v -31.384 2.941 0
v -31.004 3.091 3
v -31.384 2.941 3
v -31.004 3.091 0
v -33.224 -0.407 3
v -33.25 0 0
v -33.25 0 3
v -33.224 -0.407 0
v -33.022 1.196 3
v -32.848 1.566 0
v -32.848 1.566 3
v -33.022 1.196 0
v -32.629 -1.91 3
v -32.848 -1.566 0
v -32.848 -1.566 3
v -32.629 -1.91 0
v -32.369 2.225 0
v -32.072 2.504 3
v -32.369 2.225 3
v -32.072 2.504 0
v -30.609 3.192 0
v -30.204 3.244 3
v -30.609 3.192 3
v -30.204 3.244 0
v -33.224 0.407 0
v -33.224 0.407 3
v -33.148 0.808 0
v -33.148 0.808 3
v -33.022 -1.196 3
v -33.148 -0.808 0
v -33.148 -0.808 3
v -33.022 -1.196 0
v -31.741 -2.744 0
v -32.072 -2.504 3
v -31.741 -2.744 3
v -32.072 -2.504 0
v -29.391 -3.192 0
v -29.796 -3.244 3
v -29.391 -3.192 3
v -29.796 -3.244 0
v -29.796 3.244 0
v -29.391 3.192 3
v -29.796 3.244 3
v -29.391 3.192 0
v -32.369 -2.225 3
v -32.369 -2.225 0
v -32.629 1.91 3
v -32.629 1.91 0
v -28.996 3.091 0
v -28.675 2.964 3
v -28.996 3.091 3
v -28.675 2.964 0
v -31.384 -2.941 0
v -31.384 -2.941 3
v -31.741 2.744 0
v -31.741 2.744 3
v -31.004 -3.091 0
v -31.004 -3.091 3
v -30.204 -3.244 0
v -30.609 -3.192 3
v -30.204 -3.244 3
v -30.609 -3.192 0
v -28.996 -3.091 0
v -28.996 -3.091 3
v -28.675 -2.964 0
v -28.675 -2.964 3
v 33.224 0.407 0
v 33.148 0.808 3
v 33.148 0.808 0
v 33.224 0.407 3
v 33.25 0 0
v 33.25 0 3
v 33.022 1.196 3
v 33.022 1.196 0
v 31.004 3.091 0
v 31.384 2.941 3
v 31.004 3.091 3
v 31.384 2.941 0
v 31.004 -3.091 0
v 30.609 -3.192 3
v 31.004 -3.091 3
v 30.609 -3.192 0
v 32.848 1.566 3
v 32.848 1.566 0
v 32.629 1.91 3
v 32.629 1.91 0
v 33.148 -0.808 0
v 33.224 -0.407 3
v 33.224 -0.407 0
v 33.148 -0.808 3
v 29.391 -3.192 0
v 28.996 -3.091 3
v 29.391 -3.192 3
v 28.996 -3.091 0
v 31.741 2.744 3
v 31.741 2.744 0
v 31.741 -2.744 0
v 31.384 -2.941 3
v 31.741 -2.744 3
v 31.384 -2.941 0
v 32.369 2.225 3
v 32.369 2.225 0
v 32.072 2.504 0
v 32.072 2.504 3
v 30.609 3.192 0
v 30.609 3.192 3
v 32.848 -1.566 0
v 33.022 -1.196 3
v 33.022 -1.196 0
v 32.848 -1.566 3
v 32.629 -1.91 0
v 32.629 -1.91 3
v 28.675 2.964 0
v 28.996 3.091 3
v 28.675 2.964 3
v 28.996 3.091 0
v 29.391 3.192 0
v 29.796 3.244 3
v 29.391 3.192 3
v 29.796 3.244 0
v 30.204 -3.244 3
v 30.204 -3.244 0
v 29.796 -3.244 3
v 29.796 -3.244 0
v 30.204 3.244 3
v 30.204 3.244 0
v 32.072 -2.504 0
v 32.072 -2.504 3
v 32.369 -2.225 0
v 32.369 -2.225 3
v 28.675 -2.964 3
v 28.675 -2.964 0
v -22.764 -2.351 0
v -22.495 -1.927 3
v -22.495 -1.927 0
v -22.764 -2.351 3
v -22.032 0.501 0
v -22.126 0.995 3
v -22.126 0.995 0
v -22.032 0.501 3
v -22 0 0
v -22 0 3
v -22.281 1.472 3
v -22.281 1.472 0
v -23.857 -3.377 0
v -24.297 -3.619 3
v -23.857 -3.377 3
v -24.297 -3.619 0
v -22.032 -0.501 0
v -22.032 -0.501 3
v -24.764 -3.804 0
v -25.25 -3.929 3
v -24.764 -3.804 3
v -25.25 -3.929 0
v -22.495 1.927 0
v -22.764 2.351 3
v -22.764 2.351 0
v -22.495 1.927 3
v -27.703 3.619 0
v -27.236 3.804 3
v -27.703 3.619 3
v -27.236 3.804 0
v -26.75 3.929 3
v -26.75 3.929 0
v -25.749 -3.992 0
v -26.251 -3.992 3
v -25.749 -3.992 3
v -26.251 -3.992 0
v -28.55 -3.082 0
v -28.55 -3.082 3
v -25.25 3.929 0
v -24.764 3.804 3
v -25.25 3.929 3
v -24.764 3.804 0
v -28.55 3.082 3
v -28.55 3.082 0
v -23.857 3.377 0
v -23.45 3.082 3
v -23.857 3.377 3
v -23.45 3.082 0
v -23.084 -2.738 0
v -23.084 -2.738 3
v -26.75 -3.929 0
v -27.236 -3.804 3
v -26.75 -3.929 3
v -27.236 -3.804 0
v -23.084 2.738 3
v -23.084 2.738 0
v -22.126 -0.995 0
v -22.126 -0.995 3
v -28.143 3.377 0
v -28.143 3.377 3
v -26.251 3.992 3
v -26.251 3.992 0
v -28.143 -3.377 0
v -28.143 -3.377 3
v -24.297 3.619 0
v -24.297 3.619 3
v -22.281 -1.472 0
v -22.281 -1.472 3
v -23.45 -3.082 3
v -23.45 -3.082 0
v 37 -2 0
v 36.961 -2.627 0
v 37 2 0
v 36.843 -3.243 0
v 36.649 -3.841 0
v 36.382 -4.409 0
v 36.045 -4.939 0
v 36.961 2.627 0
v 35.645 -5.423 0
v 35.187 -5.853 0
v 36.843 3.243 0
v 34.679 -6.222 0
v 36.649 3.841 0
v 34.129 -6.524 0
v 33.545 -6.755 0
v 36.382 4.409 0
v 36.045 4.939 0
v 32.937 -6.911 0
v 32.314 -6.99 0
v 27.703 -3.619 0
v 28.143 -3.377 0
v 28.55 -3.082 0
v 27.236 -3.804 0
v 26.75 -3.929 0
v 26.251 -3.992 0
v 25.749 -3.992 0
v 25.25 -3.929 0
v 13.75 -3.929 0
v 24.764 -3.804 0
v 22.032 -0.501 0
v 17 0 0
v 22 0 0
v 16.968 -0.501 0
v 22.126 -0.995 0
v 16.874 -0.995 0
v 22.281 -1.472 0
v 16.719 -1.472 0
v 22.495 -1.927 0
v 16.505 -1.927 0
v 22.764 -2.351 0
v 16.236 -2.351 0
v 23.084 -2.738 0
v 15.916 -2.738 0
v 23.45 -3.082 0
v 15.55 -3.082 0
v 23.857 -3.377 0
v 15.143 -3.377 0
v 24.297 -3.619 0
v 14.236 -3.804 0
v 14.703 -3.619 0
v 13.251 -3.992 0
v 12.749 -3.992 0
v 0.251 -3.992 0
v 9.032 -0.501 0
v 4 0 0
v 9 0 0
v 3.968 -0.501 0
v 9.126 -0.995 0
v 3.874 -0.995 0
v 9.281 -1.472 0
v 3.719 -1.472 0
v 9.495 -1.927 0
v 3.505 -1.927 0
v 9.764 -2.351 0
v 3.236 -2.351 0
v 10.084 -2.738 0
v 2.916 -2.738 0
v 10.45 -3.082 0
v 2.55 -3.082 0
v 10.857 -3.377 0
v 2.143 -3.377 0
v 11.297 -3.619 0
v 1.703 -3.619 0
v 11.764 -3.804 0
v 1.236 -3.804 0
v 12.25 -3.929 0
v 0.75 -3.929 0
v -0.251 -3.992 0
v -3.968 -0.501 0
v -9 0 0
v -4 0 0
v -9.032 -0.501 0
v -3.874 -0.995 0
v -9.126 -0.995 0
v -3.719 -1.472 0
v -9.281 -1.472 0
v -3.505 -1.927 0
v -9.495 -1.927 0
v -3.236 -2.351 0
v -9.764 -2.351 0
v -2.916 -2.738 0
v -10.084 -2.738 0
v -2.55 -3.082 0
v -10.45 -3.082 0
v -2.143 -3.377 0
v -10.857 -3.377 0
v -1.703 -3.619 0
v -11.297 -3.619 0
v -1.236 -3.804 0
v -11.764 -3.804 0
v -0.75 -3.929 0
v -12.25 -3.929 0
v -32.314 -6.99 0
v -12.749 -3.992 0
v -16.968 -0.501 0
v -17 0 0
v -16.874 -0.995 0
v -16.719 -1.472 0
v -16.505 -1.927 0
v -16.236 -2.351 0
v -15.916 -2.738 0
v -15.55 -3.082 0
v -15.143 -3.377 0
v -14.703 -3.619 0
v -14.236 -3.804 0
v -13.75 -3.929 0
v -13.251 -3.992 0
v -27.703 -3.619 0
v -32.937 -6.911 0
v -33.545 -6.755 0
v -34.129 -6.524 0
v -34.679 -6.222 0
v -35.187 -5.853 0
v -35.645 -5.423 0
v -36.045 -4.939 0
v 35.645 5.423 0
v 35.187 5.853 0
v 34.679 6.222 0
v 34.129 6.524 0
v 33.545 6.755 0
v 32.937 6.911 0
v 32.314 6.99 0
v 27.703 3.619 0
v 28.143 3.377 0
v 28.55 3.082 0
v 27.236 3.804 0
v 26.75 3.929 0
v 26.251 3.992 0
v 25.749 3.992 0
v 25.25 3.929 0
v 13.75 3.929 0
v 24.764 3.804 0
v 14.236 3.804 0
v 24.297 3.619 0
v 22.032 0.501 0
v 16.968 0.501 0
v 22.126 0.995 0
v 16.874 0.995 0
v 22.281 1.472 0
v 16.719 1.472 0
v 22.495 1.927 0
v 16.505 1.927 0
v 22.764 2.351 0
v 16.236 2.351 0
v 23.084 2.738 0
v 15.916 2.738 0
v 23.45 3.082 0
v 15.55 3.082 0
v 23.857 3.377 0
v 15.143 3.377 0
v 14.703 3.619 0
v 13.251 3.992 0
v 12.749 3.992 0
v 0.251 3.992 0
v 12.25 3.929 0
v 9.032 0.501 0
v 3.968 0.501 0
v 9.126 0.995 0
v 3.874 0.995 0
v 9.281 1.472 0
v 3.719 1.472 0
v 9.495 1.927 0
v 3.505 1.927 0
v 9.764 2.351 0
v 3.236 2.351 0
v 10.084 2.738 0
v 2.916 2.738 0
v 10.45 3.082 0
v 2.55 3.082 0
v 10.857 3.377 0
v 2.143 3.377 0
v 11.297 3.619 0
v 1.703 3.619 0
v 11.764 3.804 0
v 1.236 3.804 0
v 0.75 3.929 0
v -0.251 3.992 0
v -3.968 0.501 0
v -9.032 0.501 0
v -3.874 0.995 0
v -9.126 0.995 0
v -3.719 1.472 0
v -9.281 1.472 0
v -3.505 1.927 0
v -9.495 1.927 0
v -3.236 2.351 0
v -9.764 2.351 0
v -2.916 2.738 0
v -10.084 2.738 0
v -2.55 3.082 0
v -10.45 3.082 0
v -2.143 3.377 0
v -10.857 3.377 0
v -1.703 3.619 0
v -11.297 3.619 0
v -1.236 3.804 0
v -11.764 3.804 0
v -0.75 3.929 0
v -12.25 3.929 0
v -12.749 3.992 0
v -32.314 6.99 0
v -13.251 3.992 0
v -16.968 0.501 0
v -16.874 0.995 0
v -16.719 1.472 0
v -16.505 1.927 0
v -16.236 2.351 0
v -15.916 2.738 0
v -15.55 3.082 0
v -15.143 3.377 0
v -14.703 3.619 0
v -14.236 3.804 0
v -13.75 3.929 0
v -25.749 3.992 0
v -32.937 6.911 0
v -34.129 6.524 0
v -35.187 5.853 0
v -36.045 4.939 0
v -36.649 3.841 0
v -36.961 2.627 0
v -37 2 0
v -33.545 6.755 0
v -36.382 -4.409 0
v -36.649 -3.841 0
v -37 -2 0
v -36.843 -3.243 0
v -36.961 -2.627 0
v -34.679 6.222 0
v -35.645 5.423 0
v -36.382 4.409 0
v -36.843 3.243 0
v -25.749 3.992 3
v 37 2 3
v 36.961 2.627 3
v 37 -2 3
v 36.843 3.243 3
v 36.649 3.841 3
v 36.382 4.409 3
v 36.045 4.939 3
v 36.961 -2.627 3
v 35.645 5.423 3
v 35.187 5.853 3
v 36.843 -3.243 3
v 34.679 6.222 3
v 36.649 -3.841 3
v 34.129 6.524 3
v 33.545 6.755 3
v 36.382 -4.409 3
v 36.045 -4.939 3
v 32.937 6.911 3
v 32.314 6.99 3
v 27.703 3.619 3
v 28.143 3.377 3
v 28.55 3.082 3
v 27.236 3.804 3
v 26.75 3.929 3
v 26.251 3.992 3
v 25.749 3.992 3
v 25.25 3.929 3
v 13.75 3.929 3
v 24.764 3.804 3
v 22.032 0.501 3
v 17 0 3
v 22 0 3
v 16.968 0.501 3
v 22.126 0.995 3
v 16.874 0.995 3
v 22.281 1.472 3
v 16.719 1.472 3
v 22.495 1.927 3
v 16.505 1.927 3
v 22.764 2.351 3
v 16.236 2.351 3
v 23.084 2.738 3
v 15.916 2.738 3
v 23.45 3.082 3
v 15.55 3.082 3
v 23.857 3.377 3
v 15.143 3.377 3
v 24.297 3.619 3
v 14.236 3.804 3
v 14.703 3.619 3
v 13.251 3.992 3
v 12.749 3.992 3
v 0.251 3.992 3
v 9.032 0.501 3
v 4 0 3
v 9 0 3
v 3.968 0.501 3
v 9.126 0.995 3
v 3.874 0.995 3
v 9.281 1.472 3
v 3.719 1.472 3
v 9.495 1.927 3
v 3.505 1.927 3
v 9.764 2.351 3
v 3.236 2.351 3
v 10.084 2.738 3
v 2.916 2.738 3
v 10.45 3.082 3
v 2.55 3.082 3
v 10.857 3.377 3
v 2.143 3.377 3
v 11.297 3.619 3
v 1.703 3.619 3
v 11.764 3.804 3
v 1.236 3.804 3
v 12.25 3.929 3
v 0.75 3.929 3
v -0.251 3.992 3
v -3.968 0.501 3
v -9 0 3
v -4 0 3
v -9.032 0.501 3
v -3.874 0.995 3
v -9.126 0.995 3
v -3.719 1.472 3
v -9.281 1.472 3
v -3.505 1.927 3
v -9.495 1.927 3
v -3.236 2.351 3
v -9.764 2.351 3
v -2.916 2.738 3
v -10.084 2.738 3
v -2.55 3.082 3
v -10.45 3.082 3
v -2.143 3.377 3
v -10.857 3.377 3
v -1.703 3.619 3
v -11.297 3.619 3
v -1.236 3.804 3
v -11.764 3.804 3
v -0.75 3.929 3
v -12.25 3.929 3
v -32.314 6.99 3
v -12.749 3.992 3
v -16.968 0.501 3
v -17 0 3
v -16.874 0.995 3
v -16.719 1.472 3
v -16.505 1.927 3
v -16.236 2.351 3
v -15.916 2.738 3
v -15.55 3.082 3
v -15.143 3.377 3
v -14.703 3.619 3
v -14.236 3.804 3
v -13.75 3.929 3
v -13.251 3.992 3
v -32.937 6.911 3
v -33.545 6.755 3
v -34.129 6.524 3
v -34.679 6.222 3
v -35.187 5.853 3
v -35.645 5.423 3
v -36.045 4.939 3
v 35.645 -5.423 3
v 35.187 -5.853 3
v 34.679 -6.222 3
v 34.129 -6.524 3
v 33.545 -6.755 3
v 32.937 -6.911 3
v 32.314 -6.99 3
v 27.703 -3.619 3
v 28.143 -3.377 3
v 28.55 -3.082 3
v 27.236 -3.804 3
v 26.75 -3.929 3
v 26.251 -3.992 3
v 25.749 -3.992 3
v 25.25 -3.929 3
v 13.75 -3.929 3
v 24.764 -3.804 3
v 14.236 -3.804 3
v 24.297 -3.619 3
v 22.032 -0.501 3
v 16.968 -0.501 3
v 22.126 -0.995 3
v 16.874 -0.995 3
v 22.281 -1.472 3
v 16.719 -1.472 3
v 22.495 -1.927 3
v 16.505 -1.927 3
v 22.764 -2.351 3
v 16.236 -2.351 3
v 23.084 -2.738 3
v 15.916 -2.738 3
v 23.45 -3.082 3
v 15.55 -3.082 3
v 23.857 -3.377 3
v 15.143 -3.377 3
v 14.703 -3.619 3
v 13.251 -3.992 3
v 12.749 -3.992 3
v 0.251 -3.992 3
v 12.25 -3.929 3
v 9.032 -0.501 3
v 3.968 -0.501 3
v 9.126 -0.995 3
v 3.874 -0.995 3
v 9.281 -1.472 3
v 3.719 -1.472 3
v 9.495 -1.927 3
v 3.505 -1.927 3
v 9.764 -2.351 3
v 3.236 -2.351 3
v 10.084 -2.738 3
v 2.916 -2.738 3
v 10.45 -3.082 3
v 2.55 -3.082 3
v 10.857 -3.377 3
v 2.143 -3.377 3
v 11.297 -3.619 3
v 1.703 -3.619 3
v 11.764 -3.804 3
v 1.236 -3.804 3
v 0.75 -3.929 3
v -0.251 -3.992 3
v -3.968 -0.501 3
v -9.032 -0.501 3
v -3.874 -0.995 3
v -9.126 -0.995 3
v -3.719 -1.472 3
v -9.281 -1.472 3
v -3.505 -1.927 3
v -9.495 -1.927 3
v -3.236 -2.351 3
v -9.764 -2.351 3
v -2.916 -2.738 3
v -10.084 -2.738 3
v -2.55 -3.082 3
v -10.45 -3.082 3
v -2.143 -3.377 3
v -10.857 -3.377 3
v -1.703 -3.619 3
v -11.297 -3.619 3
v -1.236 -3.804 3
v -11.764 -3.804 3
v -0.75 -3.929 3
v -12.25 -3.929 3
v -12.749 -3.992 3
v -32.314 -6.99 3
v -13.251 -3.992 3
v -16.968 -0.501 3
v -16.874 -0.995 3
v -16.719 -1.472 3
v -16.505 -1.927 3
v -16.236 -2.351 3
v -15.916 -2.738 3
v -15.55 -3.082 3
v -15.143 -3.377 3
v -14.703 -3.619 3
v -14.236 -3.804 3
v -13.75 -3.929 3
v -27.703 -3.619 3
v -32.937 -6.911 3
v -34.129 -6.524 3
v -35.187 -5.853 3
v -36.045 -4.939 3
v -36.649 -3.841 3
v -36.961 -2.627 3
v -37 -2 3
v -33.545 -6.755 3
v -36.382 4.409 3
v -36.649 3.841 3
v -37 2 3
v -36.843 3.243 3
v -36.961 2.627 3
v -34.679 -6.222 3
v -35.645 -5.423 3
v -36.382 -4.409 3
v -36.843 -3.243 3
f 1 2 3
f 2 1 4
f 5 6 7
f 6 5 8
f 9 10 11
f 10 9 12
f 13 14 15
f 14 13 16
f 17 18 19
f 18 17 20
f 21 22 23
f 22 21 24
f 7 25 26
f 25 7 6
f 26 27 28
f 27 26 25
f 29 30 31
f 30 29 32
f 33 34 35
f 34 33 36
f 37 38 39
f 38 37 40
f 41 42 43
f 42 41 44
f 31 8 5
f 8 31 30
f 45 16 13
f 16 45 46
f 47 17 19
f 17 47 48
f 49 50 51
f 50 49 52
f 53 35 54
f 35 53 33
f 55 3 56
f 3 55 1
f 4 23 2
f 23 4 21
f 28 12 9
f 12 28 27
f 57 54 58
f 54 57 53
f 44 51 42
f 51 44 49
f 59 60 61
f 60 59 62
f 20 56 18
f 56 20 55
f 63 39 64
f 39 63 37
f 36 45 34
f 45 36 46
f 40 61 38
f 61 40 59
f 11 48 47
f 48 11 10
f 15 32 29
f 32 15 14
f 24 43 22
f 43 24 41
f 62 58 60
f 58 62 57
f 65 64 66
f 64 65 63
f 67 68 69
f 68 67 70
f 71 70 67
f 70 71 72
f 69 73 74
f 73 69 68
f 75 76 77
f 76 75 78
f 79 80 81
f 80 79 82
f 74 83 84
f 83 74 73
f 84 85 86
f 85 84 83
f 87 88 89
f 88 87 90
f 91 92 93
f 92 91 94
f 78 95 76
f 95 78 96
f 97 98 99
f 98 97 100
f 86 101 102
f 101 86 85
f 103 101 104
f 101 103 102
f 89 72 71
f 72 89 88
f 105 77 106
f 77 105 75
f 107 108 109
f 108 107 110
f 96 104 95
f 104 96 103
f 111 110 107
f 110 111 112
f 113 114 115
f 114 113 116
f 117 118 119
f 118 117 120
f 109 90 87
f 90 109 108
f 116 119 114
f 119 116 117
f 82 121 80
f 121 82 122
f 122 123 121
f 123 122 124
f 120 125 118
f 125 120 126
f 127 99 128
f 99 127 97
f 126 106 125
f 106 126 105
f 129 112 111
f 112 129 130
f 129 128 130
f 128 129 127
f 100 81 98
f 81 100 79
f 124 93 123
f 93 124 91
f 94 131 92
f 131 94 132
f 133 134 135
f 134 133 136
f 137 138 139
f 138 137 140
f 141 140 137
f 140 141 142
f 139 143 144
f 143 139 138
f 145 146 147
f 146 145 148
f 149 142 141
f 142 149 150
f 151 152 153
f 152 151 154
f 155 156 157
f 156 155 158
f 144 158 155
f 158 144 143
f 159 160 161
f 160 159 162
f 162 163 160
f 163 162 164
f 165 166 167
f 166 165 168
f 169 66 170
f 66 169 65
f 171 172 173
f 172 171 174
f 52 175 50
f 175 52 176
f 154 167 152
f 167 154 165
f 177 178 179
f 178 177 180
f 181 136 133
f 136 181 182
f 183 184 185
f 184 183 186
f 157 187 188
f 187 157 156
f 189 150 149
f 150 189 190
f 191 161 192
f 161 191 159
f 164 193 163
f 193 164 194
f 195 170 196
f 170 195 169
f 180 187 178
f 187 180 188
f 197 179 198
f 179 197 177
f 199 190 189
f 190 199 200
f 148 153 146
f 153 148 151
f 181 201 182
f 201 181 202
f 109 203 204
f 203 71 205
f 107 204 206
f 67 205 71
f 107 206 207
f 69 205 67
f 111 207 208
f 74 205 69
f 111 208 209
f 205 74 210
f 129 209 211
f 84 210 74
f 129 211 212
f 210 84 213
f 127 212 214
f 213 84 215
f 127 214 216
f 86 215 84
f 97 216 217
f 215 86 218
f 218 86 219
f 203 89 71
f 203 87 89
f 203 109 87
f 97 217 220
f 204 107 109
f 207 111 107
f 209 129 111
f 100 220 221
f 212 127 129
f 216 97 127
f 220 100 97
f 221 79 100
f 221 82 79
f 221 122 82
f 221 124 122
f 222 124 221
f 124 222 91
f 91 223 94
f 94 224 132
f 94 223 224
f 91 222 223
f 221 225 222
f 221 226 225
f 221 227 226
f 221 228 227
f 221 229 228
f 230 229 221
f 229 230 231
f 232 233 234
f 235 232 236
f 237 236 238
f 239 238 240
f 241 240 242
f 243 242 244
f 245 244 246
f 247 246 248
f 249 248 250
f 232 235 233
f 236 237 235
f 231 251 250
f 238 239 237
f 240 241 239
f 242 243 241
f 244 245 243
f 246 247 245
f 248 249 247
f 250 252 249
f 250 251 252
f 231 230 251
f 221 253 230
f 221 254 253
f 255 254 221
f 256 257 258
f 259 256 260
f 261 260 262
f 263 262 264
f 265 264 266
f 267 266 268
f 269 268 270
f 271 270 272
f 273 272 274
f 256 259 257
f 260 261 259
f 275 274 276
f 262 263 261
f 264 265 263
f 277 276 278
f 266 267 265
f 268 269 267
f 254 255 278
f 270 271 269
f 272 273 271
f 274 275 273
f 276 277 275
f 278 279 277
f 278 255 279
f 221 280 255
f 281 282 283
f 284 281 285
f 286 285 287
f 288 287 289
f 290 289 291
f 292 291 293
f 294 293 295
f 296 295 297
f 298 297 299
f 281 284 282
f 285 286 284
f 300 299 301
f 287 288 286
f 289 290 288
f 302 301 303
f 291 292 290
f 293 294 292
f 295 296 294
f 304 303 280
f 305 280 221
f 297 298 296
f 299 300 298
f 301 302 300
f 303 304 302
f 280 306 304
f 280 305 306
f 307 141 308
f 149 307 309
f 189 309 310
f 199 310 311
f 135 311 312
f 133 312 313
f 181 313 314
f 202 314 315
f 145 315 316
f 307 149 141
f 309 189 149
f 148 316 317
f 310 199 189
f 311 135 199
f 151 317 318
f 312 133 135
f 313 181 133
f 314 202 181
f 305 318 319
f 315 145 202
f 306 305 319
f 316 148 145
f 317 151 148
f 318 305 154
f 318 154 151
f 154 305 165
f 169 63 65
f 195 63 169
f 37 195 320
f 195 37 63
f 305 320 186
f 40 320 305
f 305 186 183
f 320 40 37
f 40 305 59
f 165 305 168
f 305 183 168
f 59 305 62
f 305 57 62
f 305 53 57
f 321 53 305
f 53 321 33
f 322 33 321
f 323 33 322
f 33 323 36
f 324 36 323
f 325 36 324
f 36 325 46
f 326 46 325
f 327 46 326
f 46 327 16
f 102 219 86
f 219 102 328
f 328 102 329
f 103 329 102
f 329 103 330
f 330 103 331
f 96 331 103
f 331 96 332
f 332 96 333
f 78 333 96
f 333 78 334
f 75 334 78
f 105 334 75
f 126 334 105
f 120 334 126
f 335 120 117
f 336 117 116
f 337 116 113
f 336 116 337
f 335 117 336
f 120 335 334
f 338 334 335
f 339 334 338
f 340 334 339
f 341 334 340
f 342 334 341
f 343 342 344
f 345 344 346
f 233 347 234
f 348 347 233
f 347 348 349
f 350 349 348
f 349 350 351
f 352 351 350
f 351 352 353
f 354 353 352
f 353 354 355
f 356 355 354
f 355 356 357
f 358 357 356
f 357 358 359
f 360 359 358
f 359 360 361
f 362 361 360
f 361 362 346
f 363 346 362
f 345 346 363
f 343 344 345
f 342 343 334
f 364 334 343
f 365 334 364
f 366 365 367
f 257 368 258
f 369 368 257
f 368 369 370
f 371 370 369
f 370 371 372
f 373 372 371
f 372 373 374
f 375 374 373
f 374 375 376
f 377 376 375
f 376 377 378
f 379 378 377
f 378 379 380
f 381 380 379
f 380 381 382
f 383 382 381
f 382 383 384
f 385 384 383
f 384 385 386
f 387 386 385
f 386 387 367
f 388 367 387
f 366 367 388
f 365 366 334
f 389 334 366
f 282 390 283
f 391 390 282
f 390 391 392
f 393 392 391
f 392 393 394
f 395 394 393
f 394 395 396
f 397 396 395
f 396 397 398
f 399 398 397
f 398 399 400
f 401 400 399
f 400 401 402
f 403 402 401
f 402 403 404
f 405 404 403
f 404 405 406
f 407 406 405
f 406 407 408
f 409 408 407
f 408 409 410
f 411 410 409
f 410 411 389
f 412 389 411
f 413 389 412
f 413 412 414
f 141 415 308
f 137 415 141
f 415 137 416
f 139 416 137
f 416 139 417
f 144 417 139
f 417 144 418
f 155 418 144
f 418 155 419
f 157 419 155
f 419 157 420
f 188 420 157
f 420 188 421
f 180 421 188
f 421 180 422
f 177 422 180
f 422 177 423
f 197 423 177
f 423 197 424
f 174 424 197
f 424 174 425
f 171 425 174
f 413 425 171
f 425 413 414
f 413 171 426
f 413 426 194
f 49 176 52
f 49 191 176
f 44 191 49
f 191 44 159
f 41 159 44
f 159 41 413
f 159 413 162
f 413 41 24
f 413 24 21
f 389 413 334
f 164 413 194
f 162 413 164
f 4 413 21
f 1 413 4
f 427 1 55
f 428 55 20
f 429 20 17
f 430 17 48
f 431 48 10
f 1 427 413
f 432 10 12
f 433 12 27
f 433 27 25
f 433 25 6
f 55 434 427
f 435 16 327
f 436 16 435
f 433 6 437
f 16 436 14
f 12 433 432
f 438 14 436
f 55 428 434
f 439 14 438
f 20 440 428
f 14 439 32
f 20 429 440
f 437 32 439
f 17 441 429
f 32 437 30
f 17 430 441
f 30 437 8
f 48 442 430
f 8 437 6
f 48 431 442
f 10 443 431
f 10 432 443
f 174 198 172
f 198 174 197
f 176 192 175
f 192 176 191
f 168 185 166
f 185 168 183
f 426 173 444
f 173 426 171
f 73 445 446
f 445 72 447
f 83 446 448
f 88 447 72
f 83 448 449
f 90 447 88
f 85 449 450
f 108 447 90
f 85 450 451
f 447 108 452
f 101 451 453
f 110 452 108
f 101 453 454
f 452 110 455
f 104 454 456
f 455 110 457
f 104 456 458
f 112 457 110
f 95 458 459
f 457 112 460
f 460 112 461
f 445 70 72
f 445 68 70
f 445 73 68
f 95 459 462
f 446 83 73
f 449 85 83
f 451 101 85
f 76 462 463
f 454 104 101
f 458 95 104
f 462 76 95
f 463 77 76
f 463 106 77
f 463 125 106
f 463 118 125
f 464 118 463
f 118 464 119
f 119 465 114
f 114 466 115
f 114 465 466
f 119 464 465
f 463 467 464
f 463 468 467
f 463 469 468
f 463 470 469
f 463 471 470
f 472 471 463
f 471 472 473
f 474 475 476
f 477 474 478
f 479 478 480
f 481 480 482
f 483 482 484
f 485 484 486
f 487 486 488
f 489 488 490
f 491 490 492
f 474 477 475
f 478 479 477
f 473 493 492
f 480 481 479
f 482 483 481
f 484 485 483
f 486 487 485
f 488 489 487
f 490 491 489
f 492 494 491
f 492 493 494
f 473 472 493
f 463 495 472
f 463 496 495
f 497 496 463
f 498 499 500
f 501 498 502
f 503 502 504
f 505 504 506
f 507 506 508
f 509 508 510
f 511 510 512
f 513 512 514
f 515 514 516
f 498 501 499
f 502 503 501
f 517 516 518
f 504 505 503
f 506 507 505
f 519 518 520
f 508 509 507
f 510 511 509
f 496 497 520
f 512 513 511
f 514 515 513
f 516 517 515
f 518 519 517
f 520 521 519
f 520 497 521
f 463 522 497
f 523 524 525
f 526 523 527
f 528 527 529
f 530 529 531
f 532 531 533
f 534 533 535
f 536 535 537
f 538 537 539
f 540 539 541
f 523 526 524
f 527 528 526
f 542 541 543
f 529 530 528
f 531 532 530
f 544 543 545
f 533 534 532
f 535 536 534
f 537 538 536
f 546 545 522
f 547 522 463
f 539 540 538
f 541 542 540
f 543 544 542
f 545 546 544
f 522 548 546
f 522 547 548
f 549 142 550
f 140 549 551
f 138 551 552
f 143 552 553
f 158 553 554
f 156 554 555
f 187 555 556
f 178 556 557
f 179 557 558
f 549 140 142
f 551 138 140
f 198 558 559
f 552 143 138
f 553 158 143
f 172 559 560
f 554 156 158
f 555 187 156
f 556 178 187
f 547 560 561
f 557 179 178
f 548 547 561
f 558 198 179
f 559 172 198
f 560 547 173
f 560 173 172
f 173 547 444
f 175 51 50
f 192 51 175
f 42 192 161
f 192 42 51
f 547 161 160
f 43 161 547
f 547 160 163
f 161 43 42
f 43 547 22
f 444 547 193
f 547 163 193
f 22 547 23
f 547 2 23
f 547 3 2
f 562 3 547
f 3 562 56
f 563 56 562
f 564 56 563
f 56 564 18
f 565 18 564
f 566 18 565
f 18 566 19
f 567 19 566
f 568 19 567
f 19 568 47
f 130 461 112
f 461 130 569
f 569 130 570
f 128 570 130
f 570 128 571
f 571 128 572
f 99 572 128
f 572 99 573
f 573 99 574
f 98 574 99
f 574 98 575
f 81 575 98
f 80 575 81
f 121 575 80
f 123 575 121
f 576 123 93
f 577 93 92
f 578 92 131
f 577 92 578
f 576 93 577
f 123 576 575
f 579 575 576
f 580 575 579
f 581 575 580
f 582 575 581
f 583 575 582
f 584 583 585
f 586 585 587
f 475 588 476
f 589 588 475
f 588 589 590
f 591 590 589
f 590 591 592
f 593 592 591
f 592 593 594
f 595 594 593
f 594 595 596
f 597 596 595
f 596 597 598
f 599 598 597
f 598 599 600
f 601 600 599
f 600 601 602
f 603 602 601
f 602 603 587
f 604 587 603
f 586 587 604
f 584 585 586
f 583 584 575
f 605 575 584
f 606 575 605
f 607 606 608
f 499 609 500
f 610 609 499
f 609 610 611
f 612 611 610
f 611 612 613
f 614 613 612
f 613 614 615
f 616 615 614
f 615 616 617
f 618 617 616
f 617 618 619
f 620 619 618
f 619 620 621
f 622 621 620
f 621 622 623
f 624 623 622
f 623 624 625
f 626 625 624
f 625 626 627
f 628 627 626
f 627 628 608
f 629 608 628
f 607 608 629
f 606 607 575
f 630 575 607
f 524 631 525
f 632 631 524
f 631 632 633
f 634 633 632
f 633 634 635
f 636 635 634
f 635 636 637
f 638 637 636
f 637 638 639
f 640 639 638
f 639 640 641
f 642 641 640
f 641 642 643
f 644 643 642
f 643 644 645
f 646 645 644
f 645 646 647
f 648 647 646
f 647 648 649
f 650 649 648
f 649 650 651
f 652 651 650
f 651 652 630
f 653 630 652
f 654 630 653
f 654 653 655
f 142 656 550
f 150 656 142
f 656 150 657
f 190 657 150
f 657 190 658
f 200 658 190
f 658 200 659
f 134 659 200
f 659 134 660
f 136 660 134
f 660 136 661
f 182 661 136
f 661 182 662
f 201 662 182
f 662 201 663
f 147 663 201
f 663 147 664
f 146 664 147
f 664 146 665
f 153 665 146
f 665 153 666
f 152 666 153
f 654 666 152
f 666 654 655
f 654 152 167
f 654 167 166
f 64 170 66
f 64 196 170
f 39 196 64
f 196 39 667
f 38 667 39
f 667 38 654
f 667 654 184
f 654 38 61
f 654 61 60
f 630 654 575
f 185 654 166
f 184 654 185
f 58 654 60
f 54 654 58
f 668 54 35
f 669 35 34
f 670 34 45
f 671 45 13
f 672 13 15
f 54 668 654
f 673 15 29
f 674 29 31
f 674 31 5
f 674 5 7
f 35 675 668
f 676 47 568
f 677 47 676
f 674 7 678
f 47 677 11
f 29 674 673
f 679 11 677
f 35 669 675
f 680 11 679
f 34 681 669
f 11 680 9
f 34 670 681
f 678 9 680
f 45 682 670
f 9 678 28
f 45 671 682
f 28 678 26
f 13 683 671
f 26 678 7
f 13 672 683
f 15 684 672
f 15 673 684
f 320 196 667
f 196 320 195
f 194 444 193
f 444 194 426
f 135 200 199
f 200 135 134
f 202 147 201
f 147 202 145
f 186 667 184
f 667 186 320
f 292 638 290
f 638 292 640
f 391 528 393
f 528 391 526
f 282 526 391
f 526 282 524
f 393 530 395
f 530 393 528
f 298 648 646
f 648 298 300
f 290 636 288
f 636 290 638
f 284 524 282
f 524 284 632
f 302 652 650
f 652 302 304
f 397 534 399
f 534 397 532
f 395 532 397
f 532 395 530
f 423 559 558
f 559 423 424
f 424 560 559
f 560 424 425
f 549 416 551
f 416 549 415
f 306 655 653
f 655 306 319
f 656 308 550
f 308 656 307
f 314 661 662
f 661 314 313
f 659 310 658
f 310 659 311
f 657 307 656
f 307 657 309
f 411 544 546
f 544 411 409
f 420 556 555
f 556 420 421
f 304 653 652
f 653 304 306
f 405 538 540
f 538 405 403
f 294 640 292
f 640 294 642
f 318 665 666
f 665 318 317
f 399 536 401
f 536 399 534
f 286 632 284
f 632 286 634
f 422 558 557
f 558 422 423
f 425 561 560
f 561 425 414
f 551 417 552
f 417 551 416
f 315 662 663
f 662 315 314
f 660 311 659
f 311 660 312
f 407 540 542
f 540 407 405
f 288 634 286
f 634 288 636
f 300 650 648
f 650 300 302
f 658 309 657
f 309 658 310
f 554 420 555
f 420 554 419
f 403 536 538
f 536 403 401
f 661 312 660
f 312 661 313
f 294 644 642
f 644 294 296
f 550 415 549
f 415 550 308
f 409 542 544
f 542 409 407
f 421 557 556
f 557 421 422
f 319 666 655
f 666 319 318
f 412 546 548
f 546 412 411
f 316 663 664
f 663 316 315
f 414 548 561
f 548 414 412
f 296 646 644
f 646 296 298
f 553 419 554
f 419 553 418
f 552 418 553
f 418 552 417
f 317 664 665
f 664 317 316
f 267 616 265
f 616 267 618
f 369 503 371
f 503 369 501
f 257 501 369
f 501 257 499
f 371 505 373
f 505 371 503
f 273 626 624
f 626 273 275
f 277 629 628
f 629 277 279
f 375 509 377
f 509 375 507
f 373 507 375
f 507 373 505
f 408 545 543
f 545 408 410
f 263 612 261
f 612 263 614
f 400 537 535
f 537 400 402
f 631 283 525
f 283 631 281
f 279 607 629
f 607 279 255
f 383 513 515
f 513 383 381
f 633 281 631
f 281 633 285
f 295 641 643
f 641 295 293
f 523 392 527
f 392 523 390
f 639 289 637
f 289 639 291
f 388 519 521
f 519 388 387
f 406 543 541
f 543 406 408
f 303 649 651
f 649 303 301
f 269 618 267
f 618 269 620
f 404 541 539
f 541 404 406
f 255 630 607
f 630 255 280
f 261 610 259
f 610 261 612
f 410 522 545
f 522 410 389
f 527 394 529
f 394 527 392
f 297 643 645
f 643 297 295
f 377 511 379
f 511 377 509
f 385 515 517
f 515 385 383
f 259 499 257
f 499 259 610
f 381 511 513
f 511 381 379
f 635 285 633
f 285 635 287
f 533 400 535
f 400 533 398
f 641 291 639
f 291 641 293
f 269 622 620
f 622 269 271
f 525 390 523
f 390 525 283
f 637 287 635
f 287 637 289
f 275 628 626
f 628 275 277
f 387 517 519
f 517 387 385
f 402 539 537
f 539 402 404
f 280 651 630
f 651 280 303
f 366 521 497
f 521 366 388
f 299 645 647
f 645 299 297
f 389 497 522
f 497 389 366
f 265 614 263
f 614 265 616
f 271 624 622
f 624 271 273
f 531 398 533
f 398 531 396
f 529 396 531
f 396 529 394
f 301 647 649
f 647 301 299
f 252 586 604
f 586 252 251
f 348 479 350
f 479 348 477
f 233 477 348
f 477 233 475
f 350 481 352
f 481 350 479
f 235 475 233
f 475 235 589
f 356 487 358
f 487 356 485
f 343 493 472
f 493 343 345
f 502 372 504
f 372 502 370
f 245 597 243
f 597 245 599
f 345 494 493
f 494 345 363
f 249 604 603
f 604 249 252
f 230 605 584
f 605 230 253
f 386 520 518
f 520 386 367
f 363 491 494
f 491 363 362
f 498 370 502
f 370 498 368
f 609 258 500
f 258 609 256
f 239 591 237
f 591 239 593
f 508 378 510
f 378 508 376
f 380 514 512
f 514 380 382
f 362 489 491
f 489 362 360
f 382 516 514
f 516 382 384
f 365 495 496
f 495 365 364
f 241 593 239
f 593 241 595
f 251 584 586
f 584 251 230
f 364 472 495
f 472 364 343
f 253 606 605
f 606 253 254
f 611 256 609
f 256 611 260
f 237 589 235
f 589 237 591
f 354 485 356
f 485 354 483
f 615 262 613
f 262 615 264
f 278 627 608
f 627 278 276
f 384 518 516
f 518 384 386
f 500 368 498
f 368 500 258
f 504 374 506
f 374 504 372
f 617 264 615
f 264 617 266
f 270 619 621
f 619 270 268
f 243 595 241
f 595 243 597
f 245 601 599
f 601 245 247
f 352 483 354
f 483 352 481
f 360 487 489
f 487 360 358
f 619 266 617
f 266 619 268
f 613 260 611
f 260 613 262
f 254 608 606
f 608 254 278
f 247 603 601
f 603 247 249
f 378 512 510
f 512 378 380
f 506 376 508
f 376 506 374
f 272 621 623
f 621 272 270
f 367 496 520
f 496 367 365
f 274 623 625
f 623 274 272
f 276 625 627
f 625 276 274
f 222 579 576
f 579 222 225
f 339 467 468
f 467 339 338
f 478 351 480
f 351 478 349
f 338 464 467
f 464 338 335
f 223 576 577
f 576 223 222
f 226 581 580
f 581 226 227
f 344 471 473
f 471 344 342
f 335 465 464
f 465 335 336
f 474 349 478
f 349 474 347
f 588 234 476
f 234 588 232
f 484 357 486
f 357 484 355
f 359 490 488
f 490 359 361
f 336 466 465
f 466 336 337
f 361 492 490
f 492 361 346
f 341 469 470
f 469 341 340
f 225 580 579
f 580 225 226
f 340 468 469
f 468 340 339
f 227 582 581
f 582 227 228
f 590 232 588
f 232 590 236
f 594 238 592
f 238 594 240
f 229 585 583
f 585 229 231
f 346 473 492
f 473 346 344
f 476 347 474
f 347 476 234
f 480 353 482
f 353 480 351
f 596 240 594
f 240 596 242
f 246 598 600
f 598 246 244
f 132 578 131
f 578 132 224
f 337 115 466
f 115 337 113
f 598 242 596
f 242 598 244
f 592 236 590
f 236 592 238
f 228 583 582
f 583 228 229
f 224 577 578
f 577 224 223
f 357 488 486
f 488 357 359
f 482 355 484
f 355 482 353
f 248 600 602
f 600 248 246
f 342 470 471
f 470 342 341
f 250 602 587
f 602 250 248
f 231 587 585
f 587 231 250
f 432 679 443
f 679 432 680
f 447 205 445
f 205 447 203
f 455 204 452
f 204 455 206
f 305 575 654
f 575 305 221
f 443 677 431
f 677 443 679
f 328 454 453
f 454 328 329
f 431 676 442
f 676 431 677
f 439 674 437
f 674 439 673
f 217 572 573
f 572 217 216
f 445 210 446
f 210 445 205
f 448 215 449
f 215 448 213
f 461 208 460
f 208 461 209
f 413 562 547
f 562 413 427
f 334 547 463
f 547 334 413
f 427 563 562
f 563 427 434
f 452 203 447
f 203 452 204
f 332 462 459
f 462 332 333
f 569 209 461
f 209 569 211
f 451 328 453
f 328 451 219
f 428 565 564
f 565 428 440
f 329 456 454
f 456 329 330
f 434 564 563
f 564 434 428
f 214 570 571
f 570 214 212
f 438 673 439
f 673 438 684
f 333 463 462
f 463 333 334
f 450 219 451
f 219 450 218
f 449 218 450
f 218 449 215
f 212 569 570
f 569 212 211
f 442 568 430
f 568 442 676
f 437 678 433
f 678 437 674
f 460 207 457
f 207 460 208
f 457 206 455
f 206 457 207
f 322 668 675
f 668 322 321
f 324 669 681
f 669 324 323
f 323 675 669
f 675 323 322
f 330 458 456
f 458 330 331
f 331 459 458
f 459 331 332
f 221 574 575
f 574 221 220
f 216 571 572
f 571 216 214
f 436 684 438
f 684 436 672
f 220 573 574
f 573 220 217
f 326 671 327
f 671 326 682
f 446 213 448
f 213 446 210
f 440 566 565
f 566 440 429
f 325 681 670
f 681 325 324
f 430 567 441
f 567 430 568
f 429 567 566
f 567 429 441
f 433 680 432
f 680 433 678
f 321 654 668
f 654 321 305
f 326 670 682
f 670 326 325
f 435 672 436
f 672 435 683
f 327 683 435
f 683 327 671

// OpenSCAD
$fn = 50;


difference() {
	union() {
		hull() {
			translate(v = [-32.0000000000, 2.0000000000, 0]) {
				cylinder(h = 3, r = 5);
			}
			translate(v = [32.0000000000, 2.0000000000, 0]) {
				cylinder(h = 3, r = 5);
			}
			translate(v = [-32.0000000000, -2.0000000000, 0]) {
				cylinder(h = 3, r = 5);
			}
			translate(v = [32.0000000000, -2.0000000000, 0]) {
				cylinder(h = 3, r = 5);
			}
		}
	}
	union() {
		#translate(v = [-30.0000000000, 0.0000000000, -100.0000000000]) {
			cylinder(h = 200, r = 3.2500000000);
		}
		#translate(v = [-30.0000000000, 0.0000000000, -100.0000000000]) {
			cylinder(h = 200, r = 3.2500000000);
		}
		#translate(v = [30.0000000000, 0.0000000000, -100.0000000000]) {
			cylinder(h = 200, r = 3.2500000000);
		}
		#translate(v = [30.0000000000, 0.0000000000, -100.0000000000]) {
			cylinder(h = 200, r = 3.2500000000);
		}
		#translate(v = [-26.0000000000, 0, 0]) {
			cylinder(h = 3, r = 4.0000000000);
		}
		#translate(v = [-13.0000000000, 0, 0]) {
			cylinder(h = 3, r = 4.0000000000);
		}
		#cylinder(h = 3, r = 4.0000000000);
		#translate(v = [13.0000000000, 0, 0]) {
			cylinder(h = 3, r = 4.0000000000);
		}
		#translate(v = [26.0000000000, 0, 0]) {
			cylinder(h = 3, r = 4.0000000000);
		}
	}
}
